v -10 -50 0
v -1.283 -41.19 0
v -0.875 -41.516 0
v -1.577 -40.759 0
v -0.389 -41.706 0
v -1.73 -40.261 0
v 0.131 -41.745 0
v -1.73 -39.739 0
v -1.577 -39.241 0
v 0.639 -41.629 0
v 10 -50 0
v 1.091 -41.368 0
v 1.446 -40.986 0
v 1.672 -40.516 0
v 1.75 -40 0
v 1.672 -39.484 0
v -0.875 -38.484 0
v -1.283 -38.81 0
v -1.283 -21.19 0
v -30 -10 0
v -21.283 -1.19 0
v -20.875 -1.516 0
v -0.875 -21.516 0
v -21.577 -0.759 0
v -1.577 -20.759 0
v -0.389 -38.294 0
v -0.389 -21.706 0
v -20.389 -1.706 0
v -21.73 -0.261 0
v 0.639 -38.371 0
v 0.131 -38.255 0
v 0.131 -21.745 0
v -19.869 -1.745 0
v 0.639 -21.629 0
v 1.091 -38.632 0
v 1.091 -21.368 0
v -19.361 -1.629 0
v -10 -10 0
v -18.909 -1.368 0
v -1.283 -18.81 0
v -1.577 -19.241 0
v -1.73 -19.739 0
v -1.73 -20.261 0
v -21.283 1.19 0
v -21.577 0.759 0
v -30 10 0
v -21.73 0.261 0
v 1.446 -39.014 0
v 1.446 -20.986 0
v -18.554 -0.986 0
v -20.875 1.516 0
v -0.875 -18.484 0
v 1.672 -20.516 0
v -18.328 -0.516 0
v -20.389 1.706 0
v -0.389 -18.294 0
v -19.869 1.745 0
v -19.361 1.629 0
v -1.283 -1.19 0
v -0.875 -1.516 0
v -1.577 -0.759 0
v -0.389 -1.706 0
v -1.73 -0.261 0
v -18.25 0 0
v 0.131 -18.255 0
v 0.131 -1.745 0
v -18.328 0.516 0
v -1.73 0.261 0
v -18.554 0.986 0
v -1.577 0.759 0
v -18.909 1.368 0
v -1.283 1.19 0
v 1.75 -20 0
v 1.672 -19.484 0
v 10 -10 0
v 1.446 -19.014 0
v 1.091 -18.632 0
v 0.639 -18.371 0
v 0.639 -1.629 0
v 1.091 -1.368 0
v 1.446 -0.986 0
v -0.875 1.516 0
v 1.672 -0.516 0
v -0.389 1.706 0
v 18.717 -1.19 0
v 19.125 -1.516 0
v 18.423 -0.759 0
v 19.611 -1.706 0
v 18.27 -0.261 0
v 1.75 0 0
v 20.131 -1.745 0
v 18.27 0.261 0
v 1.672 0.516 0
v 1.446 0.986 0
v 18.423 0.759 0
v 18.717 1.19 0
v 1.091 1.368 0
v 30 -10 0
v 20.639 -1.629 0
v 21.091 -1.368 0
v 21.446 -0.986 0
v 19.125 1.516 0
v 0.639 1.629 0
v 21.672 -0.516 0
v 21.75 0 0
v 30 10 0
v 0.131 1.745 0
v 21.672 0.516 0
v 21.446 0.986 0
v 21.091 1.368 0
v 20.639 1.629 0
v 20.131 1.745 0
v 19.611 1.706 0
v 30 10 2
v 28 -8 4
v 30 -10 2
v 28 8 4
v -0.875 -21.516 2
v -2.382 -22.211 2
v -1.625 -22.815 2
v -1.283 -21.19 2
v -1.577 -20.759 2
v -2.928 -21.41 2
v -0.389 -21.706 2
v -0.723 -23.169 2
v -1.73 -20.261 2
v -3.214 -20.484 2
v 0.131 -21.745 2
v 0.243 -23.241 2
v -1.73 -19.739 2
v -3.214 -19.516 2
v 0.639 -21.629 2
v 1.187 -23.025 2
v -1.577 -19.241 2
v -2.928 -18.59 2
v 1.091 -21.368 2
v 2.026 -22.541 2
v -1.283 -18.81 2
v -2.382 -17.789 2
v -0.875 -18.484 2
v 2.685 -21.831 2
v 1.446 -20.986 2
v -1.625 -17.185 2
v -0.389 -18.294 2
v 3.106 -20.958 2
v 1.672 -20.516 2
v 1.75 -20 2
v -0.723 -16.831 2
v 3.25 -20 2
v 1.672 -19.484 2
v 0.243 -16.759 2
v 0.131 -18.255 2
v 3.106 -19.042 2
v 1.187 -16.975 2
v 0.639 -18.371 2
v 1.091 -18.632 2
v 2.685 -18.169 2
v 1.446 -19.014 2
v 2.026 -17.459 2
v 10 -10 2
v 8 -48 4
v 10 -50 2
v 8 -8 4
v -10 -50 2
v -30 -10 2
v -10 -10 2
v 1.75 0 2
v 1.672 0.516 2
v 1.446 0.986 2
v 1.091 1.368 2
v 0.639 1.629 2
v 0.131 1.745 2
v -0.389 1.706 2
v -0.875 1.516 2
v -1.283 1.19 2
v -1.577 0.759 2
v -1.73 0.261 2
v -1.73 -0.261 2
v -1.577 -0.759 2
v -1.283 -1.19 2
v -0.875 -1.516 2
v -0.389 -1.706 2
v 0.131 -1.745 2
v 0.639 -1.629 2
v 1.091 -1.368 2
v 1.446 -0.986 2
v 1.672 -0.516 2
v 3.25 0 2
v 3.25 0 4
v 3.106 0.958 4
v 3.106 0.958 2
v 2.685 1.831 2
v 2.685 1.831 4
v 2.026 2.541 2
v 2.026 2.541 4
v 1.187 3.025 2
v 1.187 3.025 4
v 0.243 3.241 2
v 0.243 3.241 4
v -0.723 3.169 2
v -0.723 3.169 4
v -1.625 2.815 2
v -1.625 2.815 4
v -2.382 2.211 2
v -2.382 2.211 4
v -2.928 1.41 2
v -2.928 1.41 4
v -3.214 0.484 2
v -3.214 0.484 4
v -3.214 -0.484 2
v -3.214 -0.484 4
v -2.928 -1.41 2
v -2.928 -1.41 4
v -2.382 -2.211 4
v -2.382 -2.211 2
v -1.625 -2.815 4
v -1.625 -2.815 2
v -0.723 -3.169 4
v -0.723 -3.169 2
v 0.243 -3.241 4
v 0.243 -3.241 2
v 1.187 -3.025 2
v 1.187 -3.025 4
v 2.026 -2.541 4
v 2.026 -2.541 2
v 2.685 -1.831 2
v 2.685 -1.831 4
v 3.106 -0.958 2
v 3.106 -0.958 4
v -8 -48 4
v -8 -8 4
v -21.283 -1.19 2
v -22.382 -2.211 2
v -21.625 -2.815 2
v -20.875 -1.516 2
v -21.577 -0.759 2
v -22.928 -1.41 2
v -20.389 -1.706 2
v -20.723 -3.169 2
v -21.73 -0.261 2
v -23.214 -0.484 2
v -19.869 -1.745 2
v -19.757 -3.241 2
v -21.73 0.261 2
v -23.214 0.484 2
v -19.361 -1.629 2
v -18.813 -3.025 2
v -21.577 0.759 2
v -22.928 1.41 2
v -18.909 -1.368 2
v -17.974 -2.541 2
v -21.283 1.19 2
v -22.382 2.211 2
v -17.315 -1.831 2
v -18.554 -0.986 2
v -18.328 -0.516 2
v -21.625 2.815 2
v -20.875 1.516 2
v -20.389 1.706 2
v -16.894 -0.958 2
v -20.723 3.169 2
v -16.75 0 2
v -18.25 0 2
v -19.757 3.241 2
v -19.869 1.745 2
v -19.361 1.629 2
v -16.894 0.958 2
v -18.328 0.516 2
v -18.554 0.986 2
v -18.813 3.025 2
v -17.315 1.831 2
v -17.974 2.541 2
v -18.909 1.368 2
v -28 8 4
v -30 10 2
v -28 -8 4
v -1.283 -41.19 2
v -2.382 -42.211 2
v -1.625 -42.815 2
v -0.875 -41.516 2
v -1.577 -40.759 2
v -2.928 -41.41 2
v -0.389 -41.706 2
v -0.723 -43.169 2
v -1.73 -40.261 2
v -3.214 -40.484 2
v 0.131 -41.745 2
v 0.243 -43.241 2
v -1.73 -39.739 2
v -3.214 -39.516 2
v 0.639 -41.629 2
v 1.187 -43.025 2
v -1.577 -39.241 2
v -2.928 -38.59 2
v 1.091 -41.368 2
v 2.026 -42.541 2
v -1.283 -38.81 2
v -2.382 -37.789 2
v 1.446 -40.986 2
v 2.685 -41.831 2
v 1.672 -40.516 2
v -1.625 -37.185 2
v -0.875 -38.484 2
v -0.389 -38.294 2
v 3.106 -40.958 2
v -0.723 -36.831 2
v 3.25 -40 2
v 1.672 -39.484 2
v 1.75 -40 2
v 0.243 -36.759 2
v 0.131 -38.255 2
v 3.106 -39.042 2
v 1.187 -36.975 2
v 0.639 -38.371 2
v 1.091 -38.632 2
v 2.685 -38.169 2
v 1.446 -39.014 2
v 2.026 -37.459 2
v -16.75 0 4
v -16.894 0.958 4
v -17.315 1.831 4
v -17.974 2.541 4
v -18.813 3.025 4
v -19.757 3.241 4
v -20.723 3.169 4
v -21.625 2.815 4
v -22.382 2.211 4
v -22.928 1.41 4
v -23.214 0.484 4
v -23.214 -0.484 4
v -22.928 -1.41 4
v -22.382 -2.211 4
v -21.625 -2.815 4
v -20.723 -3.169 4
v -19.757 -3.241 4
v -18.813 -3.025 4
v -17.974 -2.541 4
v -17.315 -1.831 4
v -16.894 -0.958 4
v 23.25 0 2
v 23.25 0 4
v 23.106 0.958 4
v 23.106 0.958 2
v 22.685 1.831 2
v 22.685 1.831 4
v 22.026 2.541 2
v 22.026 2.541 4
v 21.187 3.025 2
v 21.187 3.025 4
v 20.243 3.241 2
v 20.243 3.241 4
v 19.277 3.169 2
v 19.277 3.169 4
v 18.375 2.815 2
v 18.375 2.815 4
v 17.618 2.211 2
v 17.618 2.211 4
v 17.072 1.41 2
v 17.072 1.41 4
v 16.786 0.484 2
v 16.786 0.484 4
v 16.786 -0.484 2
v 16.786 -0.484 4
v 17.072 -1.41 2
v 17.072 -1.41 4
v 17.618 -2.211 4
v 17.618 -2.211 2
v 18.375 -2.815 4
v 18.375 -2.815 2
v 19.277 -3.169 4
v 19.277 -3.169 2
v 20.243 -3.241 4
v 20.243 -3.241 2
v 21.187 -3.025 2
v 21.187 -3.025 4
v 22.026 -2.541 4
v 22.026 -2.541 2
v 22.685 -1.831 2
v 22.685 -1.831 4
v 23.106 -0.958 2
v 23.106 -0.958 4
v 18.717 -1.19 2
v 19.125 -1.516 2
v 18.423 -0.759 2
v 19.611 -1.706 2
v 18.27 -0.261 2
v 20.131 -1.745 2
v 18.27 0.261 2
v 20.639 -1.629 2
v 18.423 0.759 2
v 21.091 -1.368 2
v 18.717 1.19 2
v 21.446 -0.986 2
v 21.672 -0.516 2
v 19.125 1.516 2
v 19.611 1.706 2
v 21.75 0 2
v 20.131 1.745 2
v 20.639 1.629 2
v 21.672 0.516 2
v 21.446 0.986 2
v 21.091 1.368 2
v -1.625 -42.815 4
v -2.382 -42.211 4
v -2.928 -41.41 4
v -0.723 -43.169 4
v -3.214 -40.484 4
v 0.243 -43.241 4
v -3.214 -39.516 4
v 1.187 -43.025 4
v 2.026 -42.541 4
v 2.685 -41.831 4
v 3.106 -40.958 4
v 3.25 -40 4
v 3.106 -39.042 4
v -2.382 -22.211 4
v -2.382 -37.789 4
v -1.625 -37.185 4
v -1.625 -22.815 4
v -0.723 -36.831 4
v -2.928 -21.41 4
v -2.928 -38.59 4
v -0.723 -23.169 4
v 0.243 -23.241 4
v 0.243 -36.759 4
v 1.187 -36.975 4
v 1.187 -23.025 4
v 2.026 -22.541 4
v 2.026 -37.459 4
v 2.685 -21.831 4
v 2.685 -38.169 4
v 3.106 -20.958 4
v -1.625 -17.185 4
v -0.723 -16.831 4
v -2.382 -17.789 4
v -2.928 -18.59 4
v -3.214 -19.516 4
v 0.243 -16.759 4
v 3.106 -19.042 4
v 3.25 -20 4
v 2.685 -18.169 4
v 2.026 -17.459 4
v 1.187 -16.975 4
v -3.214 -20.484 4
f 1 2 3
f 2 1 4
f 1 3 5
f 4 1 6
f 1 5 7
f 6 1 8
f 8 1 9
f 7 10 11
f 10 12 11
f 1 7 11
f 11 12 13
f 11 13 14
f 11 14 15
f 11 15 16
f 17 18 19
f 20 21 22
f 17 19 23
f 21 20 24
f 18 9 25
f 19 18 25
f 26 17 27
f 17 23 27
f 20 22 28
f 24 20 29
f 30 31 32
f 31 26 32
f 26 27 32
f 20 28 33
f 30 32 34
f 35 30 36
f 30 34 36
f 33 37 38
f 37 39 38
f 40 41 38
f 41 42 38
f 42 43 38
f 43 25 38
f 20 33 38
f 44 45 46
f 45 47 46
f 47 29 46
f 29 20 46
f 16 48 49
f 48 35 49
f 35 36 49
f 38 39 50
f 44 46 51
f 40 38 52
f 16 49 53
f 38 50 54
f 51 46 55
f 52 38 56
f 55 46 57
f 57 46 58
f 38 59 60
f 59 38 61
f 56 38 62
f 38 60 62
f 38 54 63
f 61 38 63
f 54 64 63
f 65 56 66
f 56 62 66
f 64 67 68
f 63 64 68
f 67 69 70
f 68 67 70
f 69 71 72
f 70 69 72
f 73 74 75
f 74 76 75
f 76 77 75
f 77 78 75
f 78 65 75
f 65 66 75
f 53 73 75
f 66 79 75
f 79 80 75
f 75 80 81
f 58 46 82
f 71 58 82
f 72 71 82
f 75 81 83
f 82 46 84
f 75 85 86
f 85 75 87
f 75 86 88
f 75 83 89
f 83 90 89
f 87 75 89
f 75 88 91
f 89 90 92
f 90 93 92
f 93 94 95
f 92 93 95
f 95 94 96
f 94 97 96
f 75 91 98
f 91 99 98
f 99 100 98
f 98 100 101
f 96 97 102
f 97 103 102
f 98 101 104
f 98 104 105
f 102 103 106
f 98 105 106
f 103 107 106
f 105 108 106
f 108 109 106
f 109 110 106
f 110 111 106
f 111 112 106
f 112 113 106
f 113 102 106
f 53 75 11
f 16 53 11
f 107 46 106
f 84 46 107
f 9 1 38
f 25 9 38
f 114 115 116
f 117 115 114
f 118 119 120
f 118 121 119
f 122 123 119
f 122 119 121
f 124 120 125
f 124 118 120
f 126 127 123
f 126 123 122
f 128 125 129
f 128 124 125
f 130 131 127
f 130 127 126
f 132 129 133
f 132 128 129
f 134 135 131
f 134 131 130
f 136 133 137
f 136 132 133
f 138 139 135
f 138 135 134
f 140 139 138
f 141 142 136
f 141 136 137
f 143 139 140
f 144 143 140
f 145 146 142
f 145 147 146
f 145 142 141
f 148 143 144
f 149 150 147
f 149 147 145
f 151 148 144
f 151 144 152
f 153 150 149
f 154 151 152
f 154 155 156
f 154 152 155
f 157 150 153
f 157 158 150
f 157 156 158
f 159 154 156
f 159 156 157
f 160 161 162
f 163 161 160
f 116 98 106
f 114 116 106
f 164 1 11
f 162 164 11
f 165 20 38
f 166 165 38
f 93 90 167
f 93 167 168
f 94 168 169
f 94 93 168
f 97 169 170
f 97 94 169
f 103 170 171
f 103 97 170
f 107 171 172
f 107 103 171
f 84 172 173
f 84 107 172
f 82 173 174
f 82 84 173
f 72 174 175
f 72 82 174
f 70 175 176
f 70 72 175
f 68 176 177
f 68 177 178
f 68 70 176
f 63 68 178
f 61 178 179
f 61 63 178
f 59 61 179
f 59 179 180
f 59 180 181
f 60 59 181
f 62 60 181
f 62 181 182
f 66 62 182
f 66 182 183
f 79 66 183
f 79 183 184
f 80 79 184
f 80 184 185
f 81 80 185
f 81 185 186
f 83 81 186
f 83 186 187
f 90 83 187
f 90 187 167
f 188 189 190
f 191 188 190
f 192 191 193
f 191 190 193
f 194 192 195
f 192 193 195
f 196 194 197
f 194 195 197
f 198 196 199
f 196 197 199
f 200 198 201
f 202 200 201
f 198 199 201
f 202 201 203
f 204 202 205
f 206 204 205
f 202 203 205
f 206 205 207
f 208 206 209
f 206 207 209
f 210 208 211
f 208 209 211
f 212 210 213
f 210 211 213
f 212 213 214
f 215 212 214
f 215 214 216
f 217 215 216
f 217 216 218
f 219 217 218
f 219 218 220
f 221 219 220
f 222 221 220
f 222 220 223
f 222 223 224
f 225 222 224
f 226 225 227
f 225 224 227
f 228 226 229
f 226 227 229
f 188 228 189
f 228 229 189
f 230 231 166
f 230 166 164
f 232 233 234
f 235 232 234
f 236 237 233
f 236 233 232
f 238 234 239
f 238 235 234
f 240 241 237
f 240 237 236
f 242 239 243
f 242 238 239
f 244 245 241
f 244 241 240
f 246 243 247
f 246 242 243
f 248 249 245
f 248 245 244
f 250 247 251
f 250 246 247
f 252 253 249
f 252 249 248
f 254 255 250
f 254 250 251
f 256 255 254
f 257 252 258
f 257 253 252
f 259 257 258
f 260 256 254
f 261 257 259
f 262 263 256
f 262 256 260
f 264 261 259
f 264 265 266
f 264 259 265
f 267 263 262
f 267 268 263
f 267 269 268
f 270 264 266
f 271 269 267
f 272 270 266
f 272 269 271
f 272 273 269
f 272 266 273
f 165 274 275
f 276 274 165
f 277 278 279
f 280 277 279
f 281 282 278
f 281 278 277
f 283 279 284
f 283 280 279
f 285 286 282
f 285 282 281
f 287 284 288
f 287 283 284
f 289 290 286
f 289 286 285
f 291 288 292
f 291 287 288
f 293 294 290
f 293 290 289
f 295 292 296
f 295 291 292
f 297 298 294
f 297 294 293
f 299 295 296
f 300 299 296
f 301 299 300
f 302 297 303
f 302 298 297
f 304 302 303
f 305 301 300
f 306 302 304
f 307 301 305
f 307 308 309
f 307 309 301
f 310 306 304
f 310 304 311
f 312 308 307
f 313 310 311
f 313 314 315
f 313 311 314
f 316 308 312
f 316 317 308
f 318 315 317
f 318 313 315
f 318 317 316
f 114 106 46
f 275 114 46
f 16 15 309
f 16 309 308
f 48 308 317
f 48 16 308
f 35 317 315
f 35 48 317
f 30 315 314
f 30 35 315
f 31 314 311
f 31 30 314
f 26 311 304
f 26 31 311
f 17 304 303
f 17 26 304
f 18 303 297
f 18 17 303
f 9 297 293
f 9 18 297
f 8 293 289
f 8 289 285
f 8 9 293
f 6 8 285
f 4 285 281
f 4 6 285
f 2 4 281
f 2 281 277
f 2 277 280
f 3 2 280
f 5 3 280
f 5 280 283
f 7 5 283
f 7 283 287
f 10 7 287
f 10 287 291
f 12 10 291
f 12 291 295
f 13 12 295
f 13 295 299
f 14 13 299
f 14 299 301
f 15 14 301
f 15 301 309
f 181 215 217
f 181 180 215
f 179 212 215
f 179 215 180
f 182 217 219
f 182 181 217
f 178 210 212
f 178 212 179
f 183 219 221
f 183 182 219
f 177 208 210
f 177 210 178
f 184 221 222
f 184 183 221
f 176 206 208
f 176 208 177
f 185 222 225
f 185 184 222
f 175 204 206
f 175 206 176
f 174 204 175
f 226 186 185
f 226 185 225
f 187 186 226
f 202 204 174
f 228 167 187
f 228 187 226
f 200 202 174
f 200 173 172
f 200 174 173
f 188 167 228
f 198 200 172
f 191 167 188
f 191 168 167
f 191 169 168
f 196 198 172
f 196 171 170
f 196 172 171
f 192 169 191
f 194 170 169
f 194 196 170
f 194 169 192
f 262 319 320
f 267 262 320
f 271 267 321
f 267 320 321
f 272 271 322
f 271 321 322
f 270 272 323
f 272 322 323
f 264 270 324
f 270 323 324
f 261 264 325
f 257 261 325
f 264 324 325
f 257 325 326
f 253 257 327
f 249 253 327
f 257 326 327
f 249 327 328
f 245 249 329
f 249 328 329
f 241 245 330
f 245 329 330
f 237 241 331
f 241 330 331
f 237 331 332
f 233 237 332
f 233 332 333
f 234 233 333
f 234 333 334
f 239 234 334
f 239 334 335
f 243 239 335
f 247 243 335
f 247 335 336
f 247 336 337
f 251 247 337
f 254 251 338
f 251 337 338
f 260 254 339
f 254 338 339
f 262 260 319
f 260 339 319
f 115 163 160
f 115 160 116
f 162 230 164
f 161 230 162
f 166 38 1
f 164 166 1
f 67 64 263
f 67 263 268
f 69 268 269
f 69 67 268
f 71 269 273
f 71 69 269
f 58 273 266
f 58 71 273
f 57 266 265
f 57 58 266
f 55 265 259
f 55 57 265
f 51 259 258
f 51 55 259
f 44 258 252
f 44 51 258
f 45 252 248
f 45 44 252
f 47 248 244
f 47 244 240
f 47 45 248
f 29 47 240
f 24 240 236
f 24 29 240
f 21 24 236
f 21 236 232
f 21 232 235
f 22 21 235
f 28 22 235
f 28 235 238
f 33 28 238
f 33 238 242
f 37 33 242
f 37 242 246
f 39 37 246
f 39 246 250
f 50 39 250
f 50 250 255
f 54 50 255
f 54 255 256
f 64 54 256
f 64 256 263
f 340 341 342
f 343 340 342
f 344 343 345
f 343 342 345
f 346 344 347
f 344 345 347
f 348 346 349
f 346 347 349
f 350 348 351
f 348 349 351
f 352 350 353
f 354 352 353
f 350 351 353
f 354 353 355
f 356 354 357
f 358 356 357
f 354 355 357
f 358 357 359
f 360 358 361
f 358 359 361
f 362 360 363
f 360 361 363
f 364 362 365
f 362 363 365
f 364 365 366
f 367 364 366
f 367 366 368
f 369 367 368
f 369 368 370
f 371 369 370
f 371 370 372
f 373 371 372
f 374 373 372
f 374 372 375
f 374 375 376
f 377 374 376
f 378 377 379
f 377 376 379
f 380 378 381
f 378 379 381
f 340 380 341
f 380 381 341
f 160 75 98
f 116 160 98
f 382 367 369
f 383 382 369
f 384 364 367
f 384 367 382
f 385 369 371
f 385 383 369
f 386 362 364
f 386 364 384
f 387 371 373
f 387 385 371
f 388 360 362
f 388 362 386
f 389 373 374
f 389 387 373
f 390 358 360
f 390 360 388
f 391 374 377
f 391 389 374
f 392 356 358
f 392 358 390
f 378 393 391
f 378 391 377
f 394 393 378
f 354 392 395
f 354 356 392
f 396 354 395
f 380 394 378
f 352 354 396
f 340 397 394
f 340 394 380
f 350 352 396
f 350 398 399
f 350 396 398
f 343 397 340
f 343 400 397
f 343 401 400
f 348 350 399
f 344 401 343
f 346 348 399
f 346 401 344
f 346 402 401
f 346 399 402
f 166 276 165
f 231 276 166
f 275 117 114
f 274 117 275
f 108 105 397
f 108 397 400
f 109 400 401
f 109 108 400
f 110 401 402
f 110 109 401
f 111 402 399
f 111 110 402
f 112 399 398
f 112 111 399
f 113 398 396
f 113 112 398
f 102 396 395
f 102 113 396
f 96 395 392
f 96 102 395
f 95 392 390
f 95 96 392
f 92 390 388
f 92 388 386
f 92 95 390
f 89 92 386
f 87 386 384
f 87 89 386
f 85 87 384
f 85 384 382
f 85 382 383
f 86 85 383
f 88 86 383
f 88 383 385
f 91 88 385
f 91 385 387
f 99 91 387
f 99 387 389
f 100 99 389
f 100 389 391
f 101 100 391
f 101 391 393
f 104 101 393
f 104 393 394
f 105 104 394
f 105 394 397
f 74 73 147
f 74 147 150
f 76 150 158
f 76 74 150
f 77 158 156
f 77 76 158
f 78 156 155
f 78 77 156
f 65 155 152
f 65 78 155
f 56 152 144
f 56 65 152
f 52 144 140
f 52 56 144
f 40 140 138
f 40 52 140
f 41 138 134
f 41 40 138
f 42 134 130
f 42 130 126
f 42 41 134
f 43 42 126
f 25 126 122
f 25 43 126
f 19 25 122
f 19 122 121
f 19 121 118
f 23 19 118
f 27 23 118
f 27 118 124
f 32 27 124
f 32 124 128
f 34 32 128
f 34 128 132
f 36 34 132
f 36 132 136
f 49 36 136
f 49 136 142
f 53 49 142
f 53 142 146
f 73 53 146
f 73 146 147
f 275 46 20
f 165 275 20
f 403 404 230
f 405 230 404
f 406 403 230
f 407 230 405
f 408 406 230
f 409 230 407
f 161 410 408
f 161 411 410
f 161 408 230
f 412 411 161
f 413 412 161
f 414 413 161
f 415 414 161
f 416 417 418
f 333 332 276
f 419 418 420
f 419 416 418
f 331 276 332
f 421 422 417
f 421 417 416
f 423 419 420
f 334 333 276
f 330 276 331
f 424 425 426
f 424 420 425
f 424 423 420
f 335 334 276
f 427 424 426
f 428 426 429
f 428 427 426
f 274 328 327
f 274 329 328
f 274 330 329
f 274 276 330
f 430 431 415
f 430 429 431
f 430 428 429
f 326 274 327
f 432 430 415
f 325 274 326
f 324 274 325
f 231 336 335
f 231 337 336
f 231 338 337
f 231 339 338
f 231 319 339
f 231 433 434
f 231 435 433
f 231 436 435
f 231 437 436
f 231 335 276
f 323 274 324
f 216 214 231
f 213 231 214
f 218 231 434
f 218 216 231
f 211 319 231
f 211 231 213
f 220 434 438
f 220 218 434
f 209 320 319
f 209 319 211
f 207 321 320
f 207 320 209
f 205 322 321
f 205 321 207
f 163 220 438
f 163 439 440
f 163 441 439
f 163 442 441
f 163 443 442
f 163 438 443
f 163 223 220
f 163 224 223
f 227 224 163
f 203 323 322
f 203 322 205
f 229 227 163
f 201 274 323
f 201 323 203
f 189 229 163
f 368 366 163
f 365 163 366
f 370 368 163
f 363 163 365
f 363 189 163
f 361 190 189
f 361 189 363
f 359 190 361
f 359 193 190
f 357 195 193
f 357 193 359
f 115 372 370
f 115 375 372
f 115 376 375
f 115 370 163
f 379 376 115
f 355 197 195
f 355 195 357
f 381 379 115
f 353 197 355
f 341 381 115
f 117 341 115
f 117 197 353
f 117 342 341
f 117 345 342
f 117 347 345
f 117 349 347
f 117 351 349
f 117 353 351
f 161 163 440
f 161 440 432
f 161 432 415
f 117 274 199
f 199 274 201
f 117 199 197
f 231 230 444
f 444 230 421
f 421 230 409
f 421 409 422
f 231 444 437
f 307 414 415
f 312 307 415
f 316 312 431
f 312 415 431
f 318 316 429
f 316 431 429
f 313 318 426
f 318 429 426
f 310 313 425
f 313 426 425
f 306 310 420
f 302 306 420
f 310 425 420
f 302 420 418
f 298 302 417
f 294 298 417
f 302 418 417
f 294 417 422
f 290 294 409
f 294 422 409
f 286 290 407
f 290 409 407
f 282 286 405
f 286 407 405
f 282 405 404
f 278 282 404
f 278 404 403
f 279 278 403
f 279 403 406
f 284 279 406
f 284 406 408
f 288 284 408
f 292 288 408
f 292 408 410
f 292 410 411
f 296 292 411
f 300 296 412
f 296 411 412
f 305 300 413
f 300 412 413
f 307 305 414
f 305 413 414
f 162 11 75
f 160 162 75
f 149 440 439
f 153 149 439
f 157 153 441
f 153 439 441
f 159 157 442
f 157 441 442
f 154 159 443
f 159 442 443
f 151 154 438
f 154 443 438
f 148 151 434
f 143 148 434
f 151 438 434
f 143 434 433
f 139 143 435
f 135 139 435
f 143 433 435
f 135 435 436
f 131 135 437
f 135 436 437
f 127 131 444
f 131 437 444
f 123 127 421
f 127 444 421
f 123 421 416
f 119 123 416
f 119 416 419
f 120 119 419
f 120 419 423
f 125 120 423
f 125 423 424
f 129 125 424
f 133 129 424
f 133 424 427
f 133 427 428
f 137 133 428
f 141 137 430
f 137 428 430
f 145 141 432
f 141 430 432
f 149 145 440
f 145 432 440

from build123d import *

# Parameters (mm, degrees)
F2_R     = 1.75
F3_DEPTH = 4
F4_SIZE  = 2
F5_R     = 3.25
F5_R_2   = 1.75
F6_DEPTH = 2


with BuildPart() as f3:
    # F2 (on Top) → F3 (new body)
    with BuildSketch(Plane.XY):
        Polygon((-10, -50), (0, -50), (10, -50), (10, -10), (30, -10), (30, 10), (0, 10), (-30, 10), (-30, -10), (-10, -10), align=None)
        with Locations((0, -40)):
            Circle(F2_R, mode=Mode.SUBTRACT)
        with Locations((-20, 0)):
            Circle(F2_R, mode=Mode.SUBTRACT)
        with Locations((0, -20)):
            Circle(F2_R, mode=Mode.SUBTRACT)
        Circle(F2_R, mode=Mode.SUBTRACT)
        with Locations((20, 0)):
            Circle(F2_R, mode=Mode.SUBTRACT)
    extrude(amount=F3_DEPTH)

    # F4
    f4_edges = [f3.edges().sort_by_distance(p)[0] for p in [
        (0, -50, 4),
        (10, -30, 4),
        (20, -10, 4),
        (30, 0, 4),
        (0, 10, 4),
        (-30, 0, 4),
        (-20, -10, 4),
        (-10, -30, 4),
    ]]
    chamfer(f4_edges, length=F4_SIZE)

    # F5 (on face) → F6 (cut)
    with BuildSketch(Plane.XY.offset(4)):
        with Locations((-20, 0)):
            Circle(F5_R)
        with Locations((-20, 0)):
            Circle(F5_R_2, mode=Mode.SUBTRACT)
        Circle(F5_R)
        Circle(F5_R_2, mode=Mode.SUBTRACT)
        with Locations((20, 0)):
            Circle(F5_R)
        with Locations((20, 0)):
            Circle(F5_R_2, mode=Mode.SUBTRACT)
        with Locations((0, -20)):
            Circle(F5_R)
        with Locations((0, -20)):
            Circle(F5_R_2, mode=Mode.SUBTRACT)
        with Locations((0, -40)):
            Circle(F5_R)
        with Locations((0, -40)):
            Circle(F5_R_2, mode=Mode.SUBTRACT)
    extrude(amount=-F6_DEPTH, mode=Mode.SUBTRACT)


solid = f3.part
